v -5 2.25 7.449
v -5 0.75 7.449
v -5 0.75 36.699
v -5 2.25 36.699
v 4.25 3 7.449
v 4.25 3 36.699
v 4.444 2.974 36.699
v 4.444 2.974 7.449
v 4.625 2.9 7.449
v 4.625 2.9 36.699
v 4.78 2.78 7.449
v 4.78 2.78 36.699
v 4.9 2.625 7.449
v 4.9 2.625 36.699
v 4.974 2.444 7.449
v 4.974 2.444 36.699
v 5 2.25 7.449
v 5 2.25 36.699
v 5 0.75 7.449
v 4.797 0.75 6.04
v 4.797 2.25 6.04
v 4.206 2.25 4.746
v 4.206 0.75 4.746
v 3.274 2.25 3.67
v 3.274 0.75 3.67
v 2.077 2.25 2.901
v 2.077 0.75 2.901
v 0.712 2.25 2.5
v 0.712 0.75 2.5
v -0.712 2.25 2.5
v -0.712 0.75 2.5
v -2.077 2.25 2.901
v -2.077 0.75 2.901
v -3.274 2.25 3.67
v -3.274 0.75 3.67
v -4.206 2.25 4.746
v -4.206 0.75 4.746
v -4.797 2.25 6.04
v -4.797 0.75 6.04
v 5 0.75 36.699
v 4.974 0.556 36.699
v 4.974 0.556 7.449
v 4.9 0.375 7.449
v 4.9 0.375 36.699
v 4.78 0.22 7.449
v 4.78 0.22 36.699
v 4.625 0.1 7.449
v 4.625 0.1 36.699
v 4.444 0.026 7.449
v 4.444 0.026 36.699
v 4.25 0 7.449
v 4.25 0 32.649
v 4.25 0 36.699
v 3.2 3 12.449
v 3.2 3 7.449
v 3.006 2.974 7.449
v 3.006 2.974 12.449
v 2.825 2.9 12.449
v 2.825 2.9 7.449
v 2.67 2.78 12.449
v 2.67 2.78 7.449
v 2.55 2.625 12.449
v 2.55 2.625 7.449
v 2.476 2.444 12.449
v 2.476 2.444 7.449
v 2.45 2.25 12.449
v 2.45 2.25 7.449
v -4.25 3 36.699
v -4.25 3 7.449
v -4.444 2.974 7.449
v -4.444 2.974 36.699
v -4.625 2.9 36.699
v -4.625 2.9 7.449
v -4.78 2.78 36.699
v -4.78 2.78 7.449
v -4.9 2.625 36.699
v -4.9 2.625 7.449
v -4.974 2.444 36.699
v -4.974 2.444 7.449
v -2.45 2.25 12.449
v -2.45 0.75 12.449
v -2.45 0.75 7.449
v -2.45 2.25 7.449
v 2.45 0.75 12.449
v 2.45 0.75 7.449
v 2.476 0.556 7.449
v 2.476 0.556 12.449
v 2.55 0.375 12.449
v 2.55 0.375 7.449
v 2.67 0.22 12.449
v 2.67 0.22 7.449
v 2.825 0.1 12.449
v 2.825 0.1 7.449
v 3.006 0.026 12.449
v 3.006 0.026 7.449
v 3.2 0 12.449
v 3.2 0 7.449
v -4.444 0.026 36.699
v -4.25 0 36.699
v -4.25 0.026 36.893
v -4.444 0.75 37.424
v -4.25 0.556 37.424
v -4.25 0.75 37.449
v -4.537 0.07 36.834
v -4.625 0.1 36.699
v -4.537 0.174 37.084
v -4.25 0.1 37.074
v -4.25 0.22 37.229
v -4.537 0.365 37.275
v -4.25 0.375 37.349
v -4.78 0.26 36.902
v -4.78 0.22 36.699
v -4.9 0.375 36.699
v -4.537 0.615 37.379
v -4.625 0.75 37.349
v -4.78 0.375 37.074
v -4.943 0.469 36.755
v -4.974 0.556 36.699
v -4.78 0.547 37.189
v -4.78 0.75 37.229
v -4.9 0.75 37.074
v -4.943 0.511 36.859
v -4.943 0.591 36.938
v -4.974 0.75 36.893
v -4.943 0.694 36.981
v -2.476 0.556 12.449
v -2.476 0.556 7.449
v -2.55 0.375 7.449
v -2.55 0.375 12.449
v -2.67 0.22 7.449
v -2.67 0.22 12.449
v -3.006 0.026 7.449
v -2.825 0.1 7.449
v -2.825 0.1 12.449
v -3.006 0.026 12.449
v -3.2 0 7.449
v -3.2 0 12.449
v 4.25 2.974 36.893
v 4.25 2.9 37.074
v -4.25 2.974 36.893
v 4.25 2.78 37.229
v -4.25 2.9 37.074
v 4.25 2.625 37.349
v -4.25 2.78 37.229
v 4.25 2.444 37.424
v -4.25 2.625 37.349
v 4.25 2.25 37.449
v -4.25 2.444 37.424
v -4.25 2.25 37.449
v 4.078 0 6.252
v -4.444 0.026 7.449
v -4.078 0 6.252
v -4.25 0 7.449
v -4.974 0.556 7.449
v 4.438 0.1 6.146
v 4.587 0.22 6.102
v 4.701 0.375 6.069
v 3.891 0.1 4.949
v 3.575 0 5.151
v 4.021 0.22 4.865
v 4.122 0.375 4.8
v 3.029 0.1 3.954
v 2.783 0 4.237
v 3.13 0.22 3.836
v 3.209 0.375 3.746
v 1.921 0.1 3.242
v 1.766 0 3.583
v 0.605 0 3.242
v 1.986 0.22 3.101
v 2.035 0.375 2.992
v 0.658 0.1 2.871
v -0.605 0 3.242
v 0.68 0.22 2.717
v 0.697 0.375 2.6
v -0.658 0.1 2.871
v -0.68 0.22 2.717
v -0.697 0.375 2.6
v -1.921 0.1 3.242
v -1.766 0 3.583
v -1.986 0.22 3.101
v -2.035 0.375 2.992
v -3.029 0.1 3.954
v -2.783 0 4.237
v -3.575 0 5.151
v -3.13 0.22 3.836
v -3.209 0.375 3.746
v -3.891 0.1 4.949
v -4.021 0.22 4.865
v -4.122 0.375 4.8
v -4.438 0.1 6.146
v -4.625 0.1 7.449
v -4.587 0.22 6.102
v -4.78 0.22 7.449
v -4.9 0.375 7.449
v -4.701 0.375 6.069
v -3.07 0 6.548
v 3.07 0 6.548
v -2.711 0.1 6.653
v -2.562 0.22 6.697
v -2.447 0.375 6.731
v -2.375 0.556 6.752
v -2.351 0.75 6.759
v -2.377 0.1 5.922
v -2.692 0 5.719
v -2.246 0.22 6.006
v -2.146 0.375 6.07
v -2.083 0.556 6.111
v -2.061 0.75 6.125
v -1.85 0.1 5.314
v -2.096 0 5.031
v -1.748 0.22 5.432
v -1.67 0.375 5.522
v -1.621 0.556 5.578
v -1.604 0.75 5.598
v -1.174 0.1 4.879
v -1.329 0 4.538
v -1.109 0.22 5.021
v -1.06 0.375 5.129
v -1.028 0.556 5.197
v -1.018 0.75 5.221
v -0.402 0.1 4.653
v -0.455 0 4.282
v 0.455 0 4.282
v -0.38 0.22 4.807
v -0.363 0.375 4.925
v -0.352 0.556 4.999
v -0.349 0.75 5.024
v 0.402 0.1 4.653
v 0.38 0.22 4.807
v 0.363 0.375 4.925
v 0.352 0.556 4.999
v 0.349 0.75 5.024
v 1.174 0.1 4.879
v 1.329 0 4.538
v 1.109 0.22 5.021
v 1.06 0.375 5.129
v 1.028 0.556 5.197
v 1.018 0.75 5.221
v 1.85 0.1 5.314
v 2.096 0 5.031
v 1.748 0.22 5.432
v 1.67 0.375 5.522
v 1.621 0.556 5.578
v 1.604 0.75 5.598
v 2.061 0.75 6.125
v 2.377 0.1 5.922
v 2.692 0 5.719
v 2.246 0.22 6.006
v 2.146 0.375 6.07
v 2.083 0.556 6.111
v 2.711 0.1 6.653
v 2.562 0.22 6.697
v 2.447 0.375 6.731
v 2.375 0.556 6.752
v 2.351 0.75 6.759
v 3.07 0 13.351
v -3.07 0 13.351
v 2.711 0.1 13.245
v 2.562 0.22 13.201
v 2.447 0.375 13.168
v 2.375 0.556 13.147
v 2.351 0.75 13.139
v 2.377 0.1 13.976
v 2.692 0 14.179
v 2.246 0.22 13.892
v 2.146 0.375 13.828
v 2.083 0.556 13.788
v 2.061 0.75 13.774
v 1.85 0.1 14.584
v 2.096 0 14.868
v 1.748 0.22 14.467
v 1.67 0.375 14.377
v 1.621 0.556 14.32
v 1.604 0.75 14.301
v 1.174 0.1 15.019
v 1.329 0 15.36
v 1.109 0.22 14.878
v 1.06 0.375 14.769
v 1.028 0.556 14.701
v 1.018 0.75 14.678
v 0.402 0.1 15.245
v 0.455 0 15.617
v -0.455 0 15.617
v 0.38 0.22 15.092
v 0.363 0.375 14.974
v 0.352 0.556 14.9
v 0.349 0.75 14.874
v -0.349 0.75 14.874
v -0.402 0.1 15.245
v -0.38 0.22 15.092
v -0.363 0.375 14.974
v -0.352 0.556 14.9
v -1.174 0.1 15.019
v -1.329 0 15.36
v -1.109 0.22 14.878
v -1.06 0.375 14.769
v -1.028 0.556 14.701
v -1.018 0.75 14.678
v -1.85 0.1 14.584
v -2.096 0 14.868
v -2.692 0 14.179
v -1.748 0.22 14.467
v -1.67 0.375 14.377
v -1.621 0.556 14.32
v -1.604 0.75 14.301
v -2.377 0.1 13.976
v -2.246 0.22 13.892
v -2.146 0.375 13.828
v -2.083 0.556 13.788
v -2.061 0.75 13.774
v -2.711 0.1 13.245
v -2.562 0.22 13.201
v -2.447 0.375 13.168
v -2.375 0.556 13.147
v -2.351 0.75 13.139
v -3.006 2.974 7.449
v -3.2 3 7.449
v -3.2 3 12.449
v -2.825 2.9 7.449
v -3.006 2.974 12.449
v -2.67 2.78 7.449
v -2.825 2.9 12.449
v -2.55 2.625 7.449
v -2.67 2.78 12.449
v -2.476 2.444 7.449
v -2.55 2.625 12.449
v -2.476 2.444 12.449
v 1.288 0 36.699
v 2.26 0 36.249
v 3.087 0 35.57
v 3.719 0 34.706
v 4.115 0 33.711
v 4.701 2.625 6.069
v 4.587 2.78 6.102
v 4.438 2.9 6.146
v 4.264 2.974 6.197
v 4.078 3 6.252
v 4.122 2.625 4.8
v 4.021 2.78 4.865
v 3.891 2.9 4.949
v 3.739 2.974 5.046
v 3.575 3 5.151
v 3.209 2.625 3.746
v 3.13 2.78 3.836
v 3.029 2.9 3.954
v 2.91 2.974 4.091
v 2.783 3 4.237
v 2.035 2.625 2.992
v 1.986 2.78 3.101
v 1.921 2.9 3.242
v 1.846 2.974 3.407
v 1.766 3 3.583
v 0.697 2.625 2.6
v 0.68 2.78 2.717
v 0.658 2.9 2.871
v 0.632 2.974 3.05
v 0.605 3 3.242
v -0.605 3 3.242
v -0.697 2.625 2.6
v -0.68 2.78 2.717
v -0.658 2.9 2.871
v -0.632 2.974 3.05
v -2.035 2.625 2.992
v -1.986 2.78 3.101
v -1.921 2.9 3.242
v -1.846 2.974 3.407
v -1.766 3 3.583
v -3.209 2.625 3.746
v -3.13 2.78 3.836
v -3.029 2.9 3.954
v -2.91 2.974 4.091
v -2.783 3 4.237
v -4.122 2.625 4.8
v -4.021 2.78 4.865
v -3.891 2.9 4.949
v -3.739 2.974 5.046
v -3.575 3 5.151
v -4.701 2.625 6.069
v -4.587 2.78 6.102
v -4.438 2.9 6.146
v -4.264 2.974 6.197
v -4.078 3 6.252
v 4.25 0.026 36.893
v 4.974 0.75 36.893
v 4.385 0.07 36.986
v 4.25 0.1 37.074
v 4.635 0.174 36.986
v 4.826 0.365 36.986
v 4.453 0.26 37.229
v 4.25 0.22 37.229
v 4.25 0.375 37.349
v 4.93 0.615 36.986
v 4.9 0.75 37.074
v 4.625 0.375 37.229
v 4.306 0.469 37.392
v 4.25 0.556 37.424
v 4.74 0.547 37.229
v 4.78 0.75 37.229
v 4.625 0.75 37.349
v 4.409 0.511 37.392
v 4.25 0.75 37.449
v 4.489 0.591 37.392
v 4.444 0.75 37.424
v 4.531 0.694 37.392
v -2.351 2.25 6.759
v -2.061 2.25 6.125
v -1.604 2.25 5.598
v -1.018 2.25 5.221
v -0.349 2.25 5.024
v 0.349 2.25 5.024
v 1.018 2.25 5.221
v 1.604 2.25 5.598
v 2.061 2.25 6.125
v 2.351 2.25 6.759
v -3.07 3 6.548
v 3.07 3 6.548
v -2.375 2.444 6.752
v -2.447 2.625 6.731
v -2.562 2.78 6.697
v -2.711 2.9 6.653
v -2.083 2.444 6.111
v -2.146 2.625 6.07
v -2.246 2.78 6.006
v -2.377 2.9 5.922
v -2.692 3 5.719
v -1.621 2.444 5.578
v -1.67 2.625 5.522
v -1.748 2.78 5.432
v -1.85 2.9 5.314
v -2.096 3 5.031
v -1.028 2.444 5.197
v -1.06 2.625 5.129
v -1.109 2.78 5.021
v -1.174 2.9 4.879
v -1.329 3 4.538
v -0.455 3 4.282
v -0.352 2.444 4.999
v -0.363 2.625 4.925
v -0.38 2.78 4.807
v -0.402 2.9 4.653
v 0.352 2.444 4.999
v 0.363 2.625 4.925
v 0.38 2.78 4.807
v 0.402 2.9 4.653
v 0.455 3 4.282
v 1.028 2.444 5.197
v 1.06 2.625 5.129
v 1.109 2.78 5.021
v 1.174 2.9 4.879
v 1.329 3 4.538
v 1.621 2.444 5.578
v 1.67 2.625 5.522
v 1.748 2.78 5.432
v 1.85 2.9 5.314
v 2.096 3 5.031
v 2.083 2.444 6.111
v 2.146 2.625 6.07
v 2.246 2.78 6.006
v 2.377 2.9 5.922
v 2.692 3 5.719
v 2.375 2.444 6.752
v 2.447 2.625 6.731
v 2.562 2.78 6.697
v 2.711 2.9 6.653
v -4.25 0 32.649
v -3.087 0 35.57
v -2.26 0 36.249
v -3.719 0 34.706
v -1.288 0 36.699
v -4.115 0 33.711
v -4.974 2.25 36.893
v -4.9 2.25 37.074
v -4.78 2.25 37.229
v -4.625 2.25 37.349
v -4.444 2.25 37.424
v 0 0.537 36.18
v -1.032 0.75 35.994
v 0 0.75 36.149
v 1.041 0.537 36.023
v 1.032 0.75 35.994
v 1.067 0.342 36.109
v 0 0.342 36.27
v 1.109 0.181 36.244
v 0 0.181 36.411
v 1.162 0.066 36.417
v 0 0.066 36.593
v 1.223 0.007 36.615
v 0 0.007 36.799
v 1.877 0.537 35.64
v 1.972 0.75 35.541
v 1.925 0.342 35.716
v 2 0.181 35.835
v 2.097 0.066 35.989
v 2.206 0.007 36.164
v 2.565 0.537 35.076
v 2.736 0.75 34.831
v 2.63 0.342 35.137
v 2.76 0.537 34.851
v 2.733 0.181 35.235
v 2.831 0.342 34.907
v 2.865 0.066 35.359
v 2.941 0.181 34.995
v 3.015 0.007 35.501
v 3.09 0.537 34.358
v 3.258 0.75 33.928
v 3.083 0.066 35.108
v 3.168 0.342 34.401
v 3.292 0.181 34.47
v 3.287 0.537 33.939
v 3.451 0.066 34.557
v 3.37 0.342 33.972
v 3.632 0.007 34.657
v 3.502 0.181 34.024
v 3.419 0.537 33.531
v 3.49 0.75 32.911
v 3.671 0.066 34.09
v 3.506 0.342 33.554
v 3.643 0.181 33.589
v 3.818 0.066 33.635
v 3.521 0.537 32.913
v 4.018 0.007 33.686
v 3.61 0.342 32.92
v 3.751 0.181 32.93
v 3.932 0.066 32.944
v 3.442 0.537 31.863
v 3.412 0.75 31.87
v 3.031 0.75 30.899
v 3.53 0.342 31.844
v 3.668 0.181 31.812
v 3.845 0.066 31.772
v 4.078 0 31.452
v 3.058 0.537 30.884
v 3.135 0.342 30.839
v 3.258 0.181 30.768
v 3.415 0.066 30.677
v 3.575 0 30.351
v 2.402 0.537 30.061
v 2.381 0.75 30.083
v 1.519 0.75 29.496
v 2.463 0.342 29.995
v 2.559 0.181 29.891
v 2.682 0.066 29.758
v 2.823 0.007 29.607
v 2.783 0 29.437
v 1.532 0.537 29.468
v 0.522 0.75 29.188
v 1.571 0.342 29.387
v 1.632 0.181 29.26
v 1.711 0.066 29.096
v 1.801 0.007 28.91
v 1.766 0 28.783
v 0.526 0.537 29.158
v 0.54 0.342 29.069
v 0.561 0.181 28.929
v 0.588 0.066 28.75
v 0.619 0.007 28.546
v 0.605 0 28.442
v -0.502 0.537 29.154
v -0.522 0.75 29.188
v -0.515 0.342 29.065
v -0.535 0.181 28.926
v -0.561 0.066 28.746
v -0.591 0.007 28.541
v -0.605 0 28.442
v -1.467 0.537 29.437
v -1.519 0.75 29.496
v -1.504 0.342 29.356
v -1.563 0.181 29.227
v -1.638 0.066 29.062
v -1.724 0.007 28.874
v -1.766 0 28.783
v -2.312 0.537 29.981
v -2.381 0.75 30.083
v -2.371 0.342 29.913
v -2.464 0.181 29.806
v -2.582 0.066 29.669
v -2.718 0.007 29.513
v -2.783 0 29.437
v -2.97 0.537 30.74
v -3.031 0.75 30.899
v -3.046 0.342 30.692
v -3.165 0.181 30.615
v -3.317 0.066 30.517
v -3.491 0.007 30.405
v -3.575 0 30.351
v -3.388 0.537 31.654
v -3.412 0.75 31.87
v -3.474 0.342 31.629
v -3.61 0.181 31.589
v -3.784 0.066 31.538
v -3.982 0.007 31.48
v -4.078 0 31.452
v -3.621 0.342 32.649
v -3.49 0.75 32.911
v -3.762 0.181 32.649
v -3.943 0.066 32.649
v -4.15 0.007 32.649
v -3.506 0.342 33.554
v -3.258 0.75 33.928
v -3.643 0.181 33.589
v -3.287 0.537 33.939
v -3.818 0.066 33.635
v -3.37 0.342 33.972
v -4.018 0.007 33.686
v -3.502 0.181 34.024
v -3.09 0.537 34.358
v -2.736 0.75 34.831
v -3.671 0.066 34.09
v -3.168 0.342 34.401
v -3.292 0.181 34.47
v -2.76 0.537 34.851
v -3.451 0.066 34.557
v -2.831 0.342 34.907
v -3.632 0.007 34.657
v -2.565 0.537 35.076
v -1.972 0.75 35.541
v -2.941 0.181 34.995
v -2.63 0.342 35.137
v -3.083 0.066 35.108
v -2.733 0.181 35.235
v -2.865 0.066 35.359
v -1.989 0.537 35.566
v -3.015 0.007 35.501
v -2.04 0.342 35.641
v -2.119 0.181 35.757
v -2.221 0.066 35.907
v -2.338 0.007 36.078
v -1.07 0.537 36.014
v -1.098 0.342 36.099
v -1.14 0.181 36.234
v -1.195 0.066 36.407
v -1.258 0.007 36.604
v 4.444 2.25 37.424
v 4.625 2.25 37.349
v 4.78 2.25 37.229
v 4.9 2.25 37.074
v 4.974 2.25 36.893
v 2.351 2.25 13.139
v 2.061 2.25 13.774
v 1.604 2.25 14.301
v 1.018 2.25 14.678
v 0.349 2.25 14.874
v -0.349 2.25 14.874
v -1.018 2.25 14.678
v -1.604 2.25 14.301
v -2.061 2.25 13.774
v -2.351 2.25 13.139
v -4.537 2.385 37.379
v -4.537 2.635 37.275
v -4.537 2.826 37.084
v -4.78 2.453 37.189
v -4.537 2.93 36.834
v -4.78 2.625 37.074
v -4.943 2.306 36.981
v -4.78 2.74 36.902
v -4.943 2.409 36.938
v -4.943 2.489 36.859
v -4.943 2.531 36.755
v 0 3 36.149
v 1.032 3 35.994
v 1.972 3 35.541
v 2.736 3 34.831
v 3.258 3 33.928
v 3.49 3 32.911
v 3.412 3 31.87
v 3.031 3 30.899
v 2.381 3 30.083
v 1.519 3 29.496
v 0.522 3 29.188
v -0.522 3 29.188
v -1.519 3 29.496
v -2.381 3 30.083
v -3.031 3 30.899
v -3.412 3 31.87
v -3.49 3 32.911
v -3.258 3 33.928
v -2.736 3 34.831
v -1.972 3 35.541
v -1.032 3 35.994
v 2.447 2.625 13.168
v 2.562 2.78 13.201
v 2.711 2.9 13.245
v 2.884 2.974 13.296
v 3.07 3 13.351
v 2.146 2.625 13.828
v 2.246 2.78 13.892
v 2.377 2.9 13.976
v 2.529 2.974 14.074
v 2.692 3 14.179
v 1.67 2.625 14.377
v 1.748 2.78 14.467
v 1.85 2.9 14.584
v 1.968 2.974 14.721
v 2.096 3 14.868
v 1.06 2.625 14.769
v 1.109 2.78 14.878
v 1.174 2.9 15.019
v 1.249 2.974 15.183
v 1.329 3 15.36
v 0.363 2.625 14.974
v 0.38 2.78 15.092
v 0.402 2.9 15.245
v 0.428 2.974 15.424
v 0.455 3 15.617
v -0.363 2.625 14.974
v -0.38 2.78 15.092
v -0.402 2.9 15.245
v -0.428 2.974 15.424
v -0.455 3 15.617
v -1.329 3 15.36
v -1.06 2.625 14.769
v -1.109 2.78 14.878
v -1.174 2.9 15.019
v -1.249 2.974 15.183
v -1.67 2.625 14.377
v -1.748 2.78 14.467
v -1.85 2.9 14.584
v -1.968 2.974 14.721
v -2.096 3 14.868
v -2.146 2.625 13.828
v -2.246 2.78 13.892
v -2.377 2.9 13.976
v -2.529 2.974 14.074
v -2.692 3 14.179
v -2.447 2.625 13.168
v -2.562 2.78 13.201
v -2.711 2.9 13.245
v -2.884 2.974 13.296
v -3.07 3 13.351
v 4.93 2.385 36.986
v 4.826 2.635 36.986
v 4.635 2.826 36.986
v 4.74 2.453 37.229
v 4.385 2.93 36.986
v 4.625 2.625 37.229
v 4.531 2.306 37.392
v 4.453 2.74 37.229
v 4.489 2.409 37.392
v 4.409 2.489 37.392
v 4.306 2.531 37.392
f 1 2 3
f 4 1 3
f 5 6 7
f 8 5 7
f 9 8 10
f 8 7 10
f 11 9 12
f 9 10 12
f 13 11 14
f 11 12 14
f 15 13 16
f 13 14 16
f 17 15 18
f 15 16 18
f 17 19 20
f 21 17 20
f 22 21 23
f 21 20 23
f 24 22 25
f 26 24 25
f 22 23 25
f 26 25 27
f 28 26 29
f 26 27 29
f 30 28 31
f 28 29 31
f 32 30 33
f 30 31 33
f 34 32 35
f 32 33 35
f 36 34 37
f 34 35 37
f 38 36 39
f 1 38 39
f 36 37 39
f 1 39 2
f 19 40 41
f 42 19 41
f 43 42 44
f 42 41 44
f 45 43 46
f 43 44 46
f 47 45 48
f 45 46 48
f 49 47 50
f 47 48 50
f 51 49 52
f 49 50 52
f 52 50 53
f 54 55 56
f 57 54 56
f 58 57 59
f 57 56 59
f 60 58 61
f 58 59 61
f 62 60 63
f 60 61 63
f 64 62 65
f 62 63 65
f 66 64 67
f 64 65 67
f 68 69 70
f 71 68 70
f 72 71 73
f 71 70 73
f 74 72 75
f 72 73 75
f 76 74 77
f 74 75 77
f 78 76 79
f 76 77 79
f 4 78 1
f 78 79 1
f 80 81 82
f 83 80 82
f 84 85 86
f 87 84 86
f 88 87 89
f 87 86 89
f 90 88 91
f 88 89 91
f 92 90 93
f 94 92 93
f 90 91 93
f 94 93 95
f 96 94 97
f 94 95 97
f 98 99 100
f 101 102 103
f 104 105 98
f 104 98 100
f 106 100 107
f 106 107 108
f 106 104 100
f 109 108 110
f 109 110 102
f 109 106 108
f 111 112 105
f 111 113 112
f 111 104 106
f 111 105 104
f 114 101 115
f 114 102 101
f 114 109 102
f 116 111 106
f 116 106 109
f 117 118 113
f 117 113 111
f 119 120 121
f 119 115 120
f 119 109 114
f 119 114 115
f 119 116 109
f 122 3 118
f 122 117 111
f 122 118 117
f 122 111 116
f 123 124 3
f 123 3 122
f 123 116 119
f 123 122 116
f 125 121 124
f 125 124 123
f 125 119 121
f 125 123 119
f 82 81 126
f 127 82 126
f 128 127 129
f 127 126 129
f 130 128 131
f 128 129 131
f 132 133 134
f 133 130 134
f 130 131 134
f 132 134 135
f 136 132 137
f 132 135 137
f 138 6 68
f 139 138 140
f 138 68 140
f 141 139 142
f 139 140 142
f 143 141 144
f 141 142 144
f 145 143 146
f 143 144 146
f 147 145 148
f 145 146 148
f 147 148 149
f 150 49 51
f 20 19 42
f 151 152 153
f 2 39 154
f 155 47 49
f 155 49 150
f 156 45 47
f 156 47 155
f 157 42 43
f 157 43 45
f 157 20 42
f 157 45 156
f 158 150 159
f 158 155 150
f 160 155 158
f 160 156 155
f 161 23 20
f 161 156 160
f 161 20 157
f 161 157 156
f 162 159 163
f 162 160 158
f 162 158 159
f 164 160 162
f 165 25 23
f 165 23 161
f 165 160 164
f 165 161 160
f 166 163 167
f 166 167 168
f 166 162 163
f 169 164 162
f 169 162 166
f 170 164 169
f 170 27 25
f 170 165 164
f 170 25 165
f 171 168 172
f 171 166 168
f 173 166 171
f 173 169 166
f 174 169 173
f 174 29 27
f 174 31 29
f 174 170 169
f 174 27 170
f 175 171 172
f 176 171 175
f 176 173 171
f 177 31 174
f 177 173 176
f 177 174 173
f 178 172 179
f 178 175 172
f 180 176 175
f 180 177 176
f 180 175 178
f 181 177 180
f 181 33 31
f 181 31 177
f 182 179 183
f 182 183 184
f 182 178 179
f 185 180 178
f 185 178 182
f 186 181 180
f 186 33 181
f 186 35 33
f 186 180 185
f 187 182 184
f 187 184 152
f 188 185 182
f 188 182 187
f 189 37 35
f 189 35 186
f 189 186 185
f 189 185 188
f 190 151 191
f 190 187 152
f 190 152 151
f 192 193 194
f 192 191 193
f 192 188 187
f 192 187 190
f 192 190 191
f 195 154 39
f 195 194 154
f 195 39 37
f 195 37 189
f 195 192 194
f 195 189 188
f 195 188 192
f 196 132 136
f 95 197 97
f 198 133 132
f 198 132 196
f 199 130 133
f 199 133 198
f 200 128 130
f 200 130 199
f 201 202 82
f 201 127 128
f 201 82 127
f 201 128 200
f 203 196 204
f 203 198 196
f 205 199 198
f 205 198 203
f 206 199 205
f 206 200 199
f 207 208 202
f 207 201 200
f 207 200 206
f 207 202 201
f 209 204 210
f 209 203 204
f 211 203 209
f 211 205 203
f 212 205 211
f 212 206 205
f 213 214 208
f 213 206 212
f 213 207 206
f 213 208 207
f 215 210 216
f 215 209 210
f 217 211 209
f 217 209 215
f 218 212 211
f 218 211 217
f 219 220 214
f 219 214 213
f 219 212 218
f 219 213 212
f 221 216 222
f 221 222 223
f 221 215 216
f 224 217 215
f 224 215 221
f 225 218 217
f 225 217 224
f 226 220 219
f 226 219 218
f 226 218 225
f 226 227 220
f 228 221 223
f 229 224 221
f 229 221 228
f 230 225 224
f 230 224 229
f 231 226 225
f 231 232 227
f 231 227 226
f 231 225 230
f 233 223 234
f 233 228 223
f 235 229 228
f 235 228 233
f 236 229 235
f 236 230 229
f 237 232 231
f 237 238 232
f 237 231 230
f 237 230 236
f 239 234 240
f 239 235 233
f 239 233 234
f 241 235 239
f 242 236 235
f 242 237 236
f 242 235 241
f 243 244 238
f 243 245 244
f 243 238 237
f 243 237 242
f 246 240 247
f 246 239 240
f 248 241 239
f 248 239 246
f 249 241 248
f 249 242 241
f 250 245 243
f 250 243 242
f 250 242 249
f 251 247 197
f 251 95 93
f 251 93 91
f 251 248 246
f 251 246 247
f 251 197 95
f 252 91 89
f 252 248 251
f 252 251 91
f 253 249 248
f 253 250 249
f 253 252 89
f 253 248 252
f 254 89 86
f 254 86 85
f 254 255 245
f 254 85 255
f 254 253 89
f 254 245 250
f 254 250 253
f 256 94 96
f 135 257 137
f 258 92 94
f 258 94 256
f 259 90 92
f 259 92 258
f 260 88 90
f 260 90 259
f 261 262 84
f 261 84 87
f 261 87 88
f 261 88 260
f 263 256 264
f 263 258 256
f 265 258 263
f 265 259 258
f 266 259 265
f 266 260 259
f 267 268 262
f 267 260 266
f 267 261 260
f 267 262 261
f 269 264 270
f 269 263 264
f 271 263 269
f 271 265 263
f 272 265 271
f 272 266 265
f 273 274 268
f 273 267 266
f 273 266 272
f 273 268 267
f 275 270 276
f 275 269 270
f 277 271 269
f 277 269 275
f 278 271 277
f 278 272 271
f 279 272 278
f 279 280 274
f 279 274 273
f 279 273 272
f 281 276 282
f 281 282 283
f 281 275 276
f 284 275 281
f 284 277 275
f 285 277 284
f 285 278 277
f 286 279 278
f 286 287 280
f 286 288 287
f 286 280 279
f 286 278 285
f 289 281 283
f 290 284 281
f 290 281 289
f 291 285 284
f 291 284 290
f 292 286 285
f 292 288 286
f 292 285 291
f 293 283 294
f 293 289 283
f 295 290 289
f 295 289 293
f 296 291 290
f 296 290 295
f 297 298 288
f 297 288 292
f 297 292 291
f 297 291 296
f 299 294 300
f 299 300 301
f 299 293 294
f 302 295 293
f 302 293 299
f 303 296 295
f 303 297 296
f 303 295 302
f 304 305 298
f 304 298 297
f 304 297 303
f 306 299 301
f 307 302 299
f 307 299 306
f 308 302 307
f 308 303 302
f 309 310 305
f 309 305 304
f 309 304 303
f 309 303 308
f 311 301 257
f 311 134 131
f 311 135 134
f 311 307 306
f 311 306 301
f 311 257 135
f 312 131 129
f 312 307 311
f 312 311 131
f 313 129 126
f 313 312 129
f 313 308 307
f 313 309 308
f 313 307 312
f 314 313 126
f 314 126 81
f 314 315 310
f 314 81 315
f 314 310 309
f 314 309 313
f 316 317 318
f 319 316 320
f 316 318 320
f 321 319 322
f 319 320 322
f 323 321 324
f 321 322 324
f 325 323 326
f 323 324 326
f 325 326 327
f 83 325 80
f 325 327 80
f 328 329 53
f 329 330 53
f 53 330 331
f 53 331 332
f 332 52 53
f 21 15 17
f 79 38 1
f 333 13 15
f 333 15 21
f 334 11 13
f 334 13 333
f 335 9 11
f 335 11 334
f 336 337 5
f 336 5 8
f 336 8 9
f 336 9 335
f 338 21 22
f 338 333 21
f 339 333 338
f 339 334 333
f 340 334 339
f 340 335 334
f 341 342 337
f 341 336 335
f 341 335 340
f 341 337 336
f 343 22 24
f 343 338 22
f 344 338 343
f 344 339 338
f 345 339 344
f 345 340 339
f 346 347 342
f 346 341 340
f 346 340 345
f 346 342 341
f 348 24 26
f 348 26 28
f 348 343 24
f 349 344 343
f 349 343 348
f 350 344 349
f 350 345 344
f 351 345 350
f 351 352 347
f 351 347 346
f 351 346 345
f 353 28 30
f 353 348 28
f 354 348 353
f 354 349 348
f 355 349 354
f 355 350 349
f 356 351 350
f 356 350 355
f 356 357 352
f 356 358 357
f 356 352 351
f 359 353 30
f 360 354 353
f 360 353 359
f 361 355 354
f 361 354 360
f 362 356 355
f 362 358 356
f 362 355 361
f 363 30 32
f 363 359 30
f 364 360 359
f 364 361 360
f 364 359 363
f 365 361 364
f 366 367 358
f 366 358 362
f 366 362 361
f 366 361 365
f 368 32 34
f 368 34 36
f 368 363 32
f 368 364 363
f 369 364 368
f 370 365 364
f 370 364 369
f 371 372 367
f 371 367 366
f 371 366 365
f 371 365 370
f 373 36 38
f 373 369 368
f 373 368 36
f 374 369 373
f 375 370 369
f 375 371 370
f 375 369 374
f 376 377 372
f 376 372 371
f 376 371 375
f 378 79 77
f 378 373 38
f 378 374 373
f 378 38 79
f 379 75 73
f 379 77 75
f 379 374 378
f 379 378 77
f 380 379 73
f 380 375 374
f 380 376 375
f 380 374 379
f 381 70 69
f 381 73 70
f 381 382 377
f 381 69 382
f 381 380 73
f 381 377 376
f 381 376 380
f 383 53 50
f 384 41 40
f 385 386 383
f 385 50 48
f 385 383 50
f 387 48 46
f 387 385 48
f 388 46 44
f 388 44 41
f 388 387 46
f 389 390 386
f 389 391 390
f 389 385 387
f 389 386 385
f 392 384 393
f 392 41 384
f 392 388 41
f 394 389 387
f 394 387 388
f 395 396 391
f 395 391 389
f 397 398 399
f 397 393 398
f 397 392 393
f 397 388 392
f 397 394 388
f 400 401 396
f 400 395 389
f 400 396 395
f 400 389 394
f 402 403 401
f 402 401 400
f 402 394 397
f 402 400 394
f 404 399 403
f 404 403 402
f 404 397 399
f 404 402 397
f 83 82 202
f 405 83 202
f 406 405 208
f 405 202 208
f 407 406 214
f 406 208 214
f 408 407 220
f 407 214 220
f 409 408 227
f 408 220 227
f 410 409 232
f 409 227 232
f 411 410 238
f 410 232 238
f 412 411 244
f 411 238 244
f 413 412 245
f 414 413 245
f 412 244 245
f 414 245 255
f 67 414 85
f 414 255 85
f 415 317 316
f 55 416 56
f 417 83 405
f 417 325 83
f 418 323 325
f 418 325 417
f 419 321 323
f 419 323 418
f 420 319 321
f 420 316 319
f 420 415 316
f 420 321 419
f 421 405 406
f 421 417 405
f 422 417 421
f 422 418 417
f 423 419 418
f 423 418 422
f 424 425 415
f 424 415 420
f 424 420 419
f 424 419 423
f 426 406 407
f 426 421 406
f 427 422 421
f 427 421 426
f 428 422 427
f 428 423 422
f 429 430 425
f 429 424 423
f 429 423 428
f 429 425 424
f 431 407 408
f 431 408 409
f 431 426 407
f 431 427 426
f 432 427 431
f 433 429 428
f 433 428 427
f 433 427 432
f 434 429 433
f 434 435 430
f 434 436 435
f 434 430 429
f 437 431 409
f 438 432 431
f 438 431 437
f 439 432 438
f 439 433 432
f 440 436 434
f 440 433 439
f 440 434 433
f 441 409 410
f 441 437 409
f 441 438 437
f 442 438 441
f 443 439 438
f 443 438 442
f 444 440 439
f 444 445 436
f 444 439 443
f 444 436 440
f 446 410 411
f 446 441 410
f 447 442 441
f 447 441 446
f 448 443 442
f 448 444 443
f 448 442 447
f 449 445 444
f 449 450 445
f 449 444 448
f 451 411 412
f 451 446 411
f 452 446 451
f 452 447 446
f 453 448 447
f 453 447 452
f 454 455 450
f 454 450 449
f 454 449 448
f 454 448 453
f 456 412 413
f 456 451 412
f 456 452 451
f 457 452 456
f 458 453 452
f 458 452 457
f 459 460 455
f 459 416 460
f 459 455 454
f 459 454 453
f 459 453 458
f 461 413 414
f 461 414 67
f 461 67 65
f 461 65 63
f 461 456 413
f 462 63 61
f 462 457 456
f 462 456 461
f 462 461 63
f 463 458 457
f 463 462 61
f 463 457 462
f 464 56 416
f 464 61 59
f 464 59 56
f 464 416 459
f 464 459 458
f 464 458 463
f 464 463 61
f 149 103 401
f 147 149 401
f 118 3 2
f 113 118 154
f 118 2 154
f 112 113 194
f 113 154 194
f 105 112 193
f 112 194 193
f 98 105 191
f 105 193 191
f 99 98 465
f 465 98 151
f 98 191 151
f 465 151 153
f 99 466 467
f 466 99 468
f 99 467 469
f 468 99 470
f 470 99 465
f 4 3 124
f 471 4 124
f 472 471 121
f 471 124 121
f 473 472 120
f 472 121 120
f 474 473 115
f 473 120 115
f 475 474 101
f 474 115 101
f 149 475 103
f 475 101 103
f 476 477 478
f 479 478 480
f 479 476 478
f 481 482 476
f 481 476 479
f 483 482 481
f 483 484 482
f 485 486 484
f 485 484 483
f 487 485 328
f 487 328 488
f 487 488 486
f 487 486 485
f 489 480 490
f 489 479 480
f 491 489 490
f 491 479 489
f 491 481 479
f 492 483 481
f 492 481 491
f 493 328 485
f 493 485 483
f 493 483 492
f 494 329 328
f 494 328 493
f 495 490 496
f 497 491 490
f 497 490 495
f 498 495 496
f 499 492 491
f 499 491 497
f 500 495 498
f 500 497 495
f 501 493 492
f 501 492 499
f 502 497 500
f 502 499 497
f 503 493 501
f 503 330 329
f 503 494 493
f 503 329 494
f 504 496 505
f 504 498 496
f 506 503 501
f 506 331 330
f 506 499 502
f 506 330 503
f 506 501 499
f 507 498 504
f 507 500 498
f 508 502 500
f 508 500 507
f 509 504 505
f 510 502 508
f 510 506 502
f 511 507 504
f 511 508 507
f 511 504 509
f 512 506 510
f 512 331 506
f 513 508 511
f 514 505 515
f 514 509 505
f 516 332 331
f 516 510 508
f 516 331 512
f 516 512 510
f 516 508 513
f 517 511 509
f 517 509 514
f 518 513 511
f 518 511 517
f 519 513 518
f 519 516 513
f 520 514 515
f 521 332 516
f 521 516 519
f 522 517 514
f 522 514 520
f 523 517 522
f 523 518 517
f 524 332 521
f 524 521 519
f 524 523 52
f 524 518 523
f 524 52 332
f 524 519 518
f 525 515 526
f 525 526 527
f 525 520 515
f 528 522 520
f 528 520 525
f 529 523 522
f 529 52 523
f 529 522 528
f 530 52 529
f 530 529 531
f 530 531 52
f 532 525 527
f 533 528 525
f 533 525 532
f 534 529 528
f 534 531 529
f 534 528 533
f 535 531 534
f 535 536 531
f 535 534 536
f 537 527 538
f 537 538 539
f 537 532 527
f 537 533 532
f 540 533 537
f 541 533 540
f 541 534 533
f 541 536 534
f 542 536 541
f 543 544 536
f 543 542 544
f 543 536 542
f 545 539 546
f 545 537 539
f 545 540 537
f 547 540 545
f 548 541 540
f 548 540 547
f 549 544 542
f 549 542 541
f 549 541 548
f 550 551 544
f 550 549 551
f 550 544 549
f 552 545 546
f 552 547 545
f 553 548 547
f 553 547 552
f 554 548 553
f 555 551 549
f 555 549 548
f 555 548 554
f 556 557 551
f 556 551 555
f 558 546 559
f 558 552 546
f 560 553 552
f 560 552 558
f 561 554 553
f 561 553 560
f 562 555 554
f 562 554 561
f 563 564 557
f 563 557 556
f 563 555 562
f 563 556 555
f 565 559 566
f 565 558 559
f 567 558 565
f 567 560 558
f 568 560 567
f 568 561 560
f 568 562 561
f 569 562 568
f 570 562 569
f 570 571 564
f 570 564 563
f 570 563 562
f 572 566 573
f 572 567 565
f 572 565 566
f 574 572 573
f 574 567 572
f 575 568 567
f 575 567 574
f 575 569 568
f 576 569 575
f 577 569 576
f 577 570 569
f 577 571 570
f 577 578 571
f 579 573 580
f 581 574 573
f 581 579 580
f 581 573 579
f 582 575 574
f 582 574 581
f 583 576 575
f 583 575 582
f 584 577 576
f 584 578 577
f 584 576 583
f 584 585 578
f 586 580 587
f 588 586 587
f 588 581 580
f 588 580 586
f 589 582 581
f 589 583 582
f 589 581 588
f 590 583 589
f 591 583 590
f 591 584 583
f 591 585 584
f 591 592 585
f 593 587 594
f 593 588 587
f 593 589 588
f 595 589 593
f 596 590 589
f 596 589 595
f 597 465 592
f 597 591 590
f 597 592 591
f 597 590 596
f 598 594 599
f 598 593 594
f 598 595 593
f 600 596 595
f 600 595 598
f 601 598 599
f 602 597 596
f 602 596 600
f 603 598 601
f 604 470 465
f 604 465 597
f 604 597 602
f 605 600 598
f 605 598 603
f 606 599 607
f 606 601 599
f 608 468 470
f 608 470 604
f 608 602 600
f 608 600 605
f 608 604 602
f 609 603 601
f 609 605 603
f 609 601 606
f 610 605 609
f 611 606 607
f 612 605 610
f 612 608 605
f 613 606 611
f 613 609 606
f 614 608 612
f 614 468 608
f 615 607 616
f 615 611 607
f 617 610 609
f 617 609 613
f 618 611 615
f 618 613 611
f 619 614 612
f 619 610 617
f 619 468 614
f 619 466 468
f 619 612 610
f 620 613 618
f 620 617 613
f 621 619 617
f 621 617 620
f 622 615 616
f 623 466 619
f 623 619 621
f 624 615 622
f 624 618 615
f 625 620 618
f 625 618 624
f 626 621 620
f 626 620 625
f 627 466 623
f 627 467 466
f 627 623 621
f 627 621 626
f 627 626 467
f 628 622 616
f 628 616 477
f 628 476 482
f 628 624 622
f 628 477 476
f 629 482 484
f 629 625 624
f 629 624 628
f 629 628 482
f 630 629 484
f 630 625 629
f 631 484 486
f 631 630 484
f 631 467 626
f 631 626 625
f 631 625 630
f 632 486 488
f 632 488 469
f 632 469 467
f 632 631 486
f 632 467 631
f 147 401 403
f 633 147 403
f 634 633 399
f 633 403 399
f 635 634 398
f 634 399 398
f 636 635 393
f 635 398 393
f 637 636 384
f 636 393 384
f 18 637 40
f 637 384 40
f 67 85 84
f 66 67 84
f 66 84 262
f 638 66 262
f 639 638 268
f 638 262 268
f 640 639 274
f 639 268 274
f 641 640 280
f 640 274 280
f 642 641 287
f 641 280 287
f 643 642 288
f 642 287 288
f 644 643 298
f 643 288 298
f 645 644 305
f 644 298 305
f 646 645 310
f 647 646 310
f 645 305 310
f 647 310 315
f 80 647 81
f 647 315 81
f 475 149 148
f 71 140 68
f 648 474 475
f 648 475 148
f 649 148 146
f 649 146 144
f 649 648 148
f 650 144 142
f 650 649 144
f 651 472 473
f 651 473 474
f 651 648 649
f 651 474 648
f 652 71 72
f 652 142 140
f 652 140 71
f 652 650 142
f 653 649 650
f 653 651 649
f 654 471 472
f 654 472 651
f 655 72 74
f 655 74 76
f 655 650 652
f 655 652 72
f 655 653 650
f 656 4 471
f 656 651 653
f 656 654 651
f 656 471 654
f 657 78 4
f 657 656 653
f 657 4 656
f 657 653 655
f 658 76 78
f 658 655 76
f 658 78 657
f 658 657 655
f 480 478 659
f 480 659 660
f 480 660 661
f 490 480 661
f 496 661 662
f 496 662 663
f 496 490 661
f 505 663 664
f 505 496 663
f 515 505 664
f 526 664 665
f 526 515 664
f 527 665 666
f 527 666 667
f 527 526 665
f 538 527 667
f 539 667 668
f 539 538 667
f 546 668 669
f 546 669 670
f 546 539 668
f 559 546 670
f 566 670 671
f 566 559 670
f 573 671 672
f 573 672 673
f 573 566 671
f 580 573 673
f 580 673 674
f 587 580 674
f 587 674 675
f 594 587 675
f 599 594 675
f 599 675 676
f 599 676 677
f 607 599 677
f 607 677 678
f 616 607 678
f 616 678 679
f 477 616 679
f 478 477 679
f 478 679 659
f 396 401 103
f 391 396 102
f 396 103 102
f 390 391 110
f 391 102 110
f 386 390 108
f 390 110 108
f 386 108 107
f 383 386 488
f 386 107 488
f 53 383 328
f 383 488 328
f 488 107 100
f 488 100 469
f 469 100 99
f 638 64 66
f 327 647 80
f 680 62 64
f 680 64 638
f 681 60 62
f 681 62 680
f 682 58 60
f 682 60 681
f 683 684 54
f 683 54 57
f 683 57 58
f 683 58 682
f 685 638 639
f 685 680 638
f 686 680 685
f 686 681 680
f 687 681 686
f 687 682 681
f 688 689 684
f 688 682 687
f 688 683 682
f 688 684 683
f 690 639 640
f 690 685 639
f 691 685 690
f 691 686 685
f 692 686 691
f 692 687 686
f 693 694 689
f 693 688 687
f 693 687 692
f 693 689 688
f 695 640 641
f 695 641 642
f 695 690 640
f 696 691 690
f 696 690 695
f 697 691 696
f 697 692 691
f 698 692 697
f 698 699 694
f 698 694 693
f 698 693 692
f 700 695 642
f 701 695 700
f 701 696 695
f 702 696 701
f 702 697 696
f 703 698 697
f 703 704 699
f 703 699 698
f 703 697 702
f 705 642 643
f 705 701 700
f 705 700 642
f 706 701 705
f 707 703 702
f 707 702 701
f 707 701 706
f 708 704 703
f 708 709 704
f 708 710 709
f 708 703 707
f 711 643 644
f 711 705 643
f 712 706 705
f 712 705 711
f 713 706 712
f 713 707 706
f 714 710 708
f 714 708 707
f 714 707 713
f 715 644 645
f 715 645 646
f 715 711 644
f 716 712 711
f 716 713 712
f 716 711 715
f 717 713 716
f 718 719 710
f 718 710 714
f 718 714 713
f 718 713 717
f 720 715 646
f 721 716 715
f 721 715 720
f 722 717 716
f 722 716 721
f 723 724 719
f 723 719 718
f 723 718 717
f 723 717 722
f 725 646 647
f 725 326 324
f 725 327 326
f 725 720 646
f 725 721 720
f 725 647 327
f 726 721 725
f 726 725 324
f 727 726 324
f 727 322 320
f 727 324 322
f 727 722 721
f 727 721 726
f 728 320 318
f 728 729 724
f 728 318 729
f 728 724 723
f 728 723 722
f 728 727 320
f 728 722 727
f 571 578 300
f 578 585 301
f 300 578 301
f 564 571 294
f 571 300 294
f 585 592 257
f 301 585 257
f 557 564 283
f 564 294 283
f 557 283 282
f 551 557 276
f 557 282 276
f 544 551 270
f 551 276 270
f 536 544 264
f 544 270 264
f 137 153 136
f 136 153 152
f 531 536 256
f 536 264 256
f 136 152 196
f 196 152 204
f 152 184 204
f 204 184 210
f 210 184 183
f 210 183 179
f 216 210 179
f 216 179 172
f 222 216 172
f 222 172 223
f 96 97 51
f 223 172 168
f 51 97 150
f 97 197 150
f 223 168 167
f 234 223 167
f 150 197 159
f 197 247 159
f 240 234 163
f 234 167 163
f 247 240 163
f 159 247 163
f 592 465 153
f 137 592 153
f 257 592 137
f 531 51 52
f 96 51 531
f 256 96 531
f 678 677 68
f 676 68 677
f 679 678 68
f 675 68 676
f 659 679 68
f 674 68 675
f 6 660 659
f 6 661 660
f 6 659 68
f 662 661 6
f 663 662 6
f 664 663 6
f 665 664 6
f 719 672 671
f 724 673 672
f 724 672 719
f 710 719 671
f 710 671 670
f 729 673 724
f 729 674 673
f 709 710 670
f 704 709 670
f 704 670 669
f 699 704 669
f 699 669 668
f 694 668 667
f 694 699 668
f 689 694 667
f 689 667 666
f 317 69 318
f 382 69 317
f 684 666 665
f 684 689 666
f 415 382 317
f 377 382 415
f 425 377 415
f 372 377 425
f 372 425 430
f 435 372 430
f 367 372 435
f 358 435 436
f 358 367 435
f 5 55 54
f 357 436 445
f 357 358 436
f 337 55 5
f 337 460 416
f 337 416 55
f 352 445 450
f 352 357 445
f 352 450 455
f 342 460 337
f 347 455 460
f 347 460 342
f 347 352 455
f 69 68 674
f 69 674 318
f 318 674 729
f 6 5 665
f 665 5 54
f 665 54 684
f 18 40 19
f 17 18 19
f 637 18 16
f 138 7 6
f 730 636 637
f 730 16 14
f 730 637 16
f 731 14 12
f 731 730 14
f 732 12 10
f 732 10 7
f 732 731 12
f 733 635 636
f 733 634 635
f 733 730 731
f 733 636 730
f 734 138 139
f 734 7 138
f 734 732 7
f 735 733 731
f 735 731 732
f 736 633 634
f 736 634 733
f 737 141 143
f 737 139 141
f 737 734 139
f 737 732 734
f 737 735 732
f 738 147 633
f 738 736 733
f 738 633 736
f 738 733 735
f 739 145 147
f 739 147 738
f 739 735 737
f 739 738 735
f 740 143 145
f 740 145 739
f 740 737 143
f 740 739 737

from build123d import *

# Parameters (mm, degrees)
SKETCH1_R           = 3.5
BOSS_EXTRUDE1_DEPTH = 3
FILLET1_R           = 0.75


with BuildPart() as part:
    # Sketch1 → Boss-Extrude1 (new body)
    with BuildSketch(Plane(origin=(0, 0, 0), x_dir=(1, 0, 0), z_dir=(0, 1, 0))):
        with BuildLine():
            Line((-5, -37.44915748), (5, -37.44915748))
            Line((5, -37.44915748), (5, -7.44915748))
            ThreePointArc((5, -7.44915748), (0, -2.44915748), (-5, -7.44915748))
            Line((-5, -7.44915748), (-5, -37.44915748))
        make_face()
        with Locations(Location((0, -32.64915748, 0), (0, 0, 270))):
            Circle(SKETCH1_R, mode=Mode.SUBTRACT)
        with BuildLine():
            Line((2.45, -7.44915748), (2.45, -12.44915748))
            ThreePointArc((2.45, -12.44915748), (0, -14.89915748), (-2.45, -12.44915748))
            Line((-2.45, -12.44915748), (-2.45, -7.44915748))
            ThreePointArc((-2.45, -7.44915748), (0, -4.99915748), (2.45, -7.44915748))
        make_face(mode=Mode.SUBTRACT)
    extrude(amount=BOSS_EXTRUDE1_DEPTH)

    # Fillet1
    # the kernel refuses this fillet: 0.75 mm, written as the material it takes off along each edge
    with BuildSketch(Plane(origin=(-4.25, 2.25, 36.69915748), x_dir=(0, 0, 1), z_dir=(-1, 0, 0))) as fillet1_piece_1_section:
        Polygon((0, 0), (FILLET1_R, 0), (FILLET1_R, FILLET1_R), (0, FILLET1_R), align=None)
    fillet1_piece_1 = extrude(amount=FILLET1_R, mode=Mode.PRIVATE)
    fillet1_piece_1 = fillet1_piece_1 - Plane(origin=(-4.25, 2.25, 36.69915748), x_dir=(0, -0.7071067811865475, -0.7071067811865475), z_dir=(-1, 0, 0)) * Sphere(FILLET1_R, mode=Mode.PRIVATE)
    add(fillet1_piece_1, mode=Mode.SUBTRACT)
    with BuildSketch(Plane(origin=(4.25, 2.25, 36.69915748), x_dir=(0, 1, 0), z_dir=(0, 0, 1))) as fillet1_piece_2_section:
        Polygon((0, 0), (FILLET1_R, 0), (FILLET1_R, -FILLET1_R), (0, -FILLET1_R), align=None)
    fillet1_piece_2 = extrude(amount=FILLET1_R, mode=Mode.PRIVATE)
    fillet1_piece_2 = fillet1_piece_2 - Plane(origin=(4.25, 2.25, 36.69915748), x_dir=(-0.7071067811865475, -0.7071067811865475, 0), z_dir=(0, 0, 1)) * Sphere(FILLET1_R, mode=Mode.PRIVATE)
    add(fillet1_piece_2, mode=Mode.SUBTRACT)
    with BuildSketch(Plane(origin=(-4.25, 0.75, 36.69915748), x_dir=(0, 0, 1), z_dir=(-1, 0, 0))) as fillet1_piece_3_section:
        Polygon((0, 0), (FILLET1_R, 0), (FILLET1_R, -FILLET1_R), (0, -FILLET1_R), align=None)
    fillet1_piece_3 = extrude(amount=FILLET1_R, mode=Mode.PRIVATE)
    fillet1_piece_3 = fillet1_piece_3 - Plane(origin=(-4.25, 0.75, 36.69915748), x_dir=(0, 0.7071067811865475, -0.7071067811865475), z_dir=(-1, 0, 0)) * Sphere(FILLET1_R, mode=Mode.PRIVATE)
    add(fillet1_piece_3, mode=Mode.SUBTRACT)
    with BuildSketch(Plane(origin=(4.25, 0.75, 36.69915748), x_dir=(1, 0, 0), z_dir=(0, 0, 1))) as fillet1_piece_4_section:
        Polygon((0, 0), (FILLET1_R, 0), (FILLET1_R, -FILLET1_R), (0, -FILLET1_R), align=None)
    fillet1_piece_4 = extrude(amount=FILLET1_R, mode=Mode.PRIVATE)
    fillet1_piece_4 = fillet1_piece_4 - Plane(origin=(4.25, 0.75, 36.69915748), x_dir=(-0.7071067811865475, 0.7071067811865475, 0), z_dir=(0, 0, 1)) * Sphere(FILLET1_R, mode=Mode.PRIVATE)
    add(fillet1_piece_4, mode=Mode.SUBTRACT)
    with BuildSketch(Plane(origin=(-5, 3, 7.44915748), x_dir=(0, -1, 0), z_dir=(0, 0, 1)), Plane(origin=(5, 3, 36.69915748), x_dir=(0, -1, 0), z_dir=(0, 0, -1))) as fillet1_piece_5:
        with BuildLine():
            CenterArc((FILLET1_R, FILLET1_R), FILLET1_R, 180, 90)
            Line((0, FILLET1_R), (0, 0))
            Line((0, 0), (FILLET1_R, 0))
        make_face()
    extrude(amount=29.25, mode=Mode.SUBTRACT)
    with BuildSketch(Plane(origin=(0, 0, 7.44915748), x_dir=(-1, 0, 0), z_dir=(0, 0, 1))) as fillet1_piece_6:
        with BuildLine():
            CenterArc((2.45 + FILLET1_R, -FILLET1_R), FILLET1_R, 90, 90)
            Line((2.45 + FILLET1_R, 0), (2.45, 0))
            Line((2.45, 0), (2.45, -FILLET1_R))
        make_face()
    revolve(axis=Axis((0, 0, 7.44915748), (0, -1, 0)), revolution_arc=180, mode=Mode.SUBTRACT)
    with BuildSketch(Plane(origin=(-2.45, 0, 12.44915748), x_dir=(0, 1, 0), z_dir=(0, 0, -1)), Plane(origin=(2.45, 0, 7.44915748), x_dir=(0, 1, 0), z_dir=(0, 0, 1))) as fillet1_piece_7:
        with BuildLine():
            CenterArc((FILLET1_R, -FILLET1_R), FILLET1_R, 90, 90)
            Line((0, -FILLET1_R), (0, 0))
            Line((0, 0), (FILLET1_R, 0))
        make_face()
    extrude(amount=5, mode=Mode.SUBTRACT)
    with BuildSketch(Plane(origin=(0, 0, 12.44915748), x_dir=(1, 0, 0), z_dir=(0, 0, -1))) as fillet1_piece_8:
        with BuildLine():
            CenterArc((2.45 + FILLET1_R, -FILLET1_R), FILLET1_R, 90, 90)
            Line((2.45 + FILLET1_R, 0), (2.45, 0))
            Line((2.45, 0), (2.45, -FILLET1_R))
        make_face()
    revolve(axis=Axis((0, 0, 12.44915748), (0, -1, 0)), revolution_arc=180, mode=Mode.SUBTRACT)
    with BuildSketch(Plane(origin=(0, 3, 7.44915748), x_dir=(-1, 0, 0), z_dir=(0, 0, 1))) as fillet1_piece_9:
        with BuildLine():
            CenterArc((2.45 + FILLET1_R, FILLET1_R), FILLET1_R, 180, 90)
            Line((2.45 + FILLET1_R, 0), (2.45, 0))
            Line((2.45, 0), (2.45, FILLET1_R))
        make_face()
    revolve(axis=Axis((0, 3, 7.44915748), (0, -1, 0)), revolution_arc=180, mode=Mode.SUBTRACT)
    with BuildSketch(Plane(origin=(-4.25, 3, 37.44915748), x_dir=(0, -1, 0), z_dir=(1, 0, 0))) as fillet1_piece_10:
        with BuildLine():
            CenterArc((FILLET1_R, FILLET1_R), FILLET1_R, 180, 90)
            Line((0, FILLET1_R), (0, 0))
            Line((0, 0), (FILLET1_R, 0))
        make_face()
    extrude(amount=8.5, mode=Mode.SUBTRACT)
    with BuildSketch(Plane(origin=(-2.45, 3, 12.44915748), x_dir=(0, -1, 0), z_dir=(0, 0, -1)), Plane(origin=(2.45, 3, 7.44915748), x_dir=(0, -1, 0), z_dir=(0, 0, 1))) as fillet1_piece_11:
        with BuildLine():
            CenterArc((FILLET1_R, FILLET1_R), FILLET1_R, 180, 90)
            Line((0, FILLET1_R), (0, 0))
            Line((0, 0), (FILLET1_R, 0))
        make_face()
    extrude(amount=5, mode=Mode.SUBTRACT)
    with BuildSketch(Plane(origin=(0, 3, 12.44915748), x_dir=(1, 0, 0), z_dir=(0, 0, -1))) as fillet1_piece_12:
        with BuildLine():
            CenterArc((2.45 + FILLET1_R, FILLET1_R), FILLET1_R, 180, 90)
            Line((2.45 + FILLET1_R, 0), (2.45, 0))
            Line((2.45, 0), (2.45, FILLET1_R))
        make_face()
    revolve(axis=Axis((0, 3, 12.44915748), (0, -1, 0)), revolution_arc=180, mode=Mode.SUBTRACT)
    with BuildSketch(Plane(origin=(0, 0, 32.64915748), x_dir=(0, 0, 1), z_dir=(-1, 0, 0))) as fillet1_piece_13:
        with BuildLine():
            CenterArc((3.5 + FILLET1_R, FILLET1_R), FILLET1_R, 180, 90)
            Line((3.5 + FILLET1_R, 0), (3.5, 0))
            Line((3.5, 0), (3.5, FILLET1_R))
        make_face()
    revolve(axis=Axis((0, 0, 32.64915748), (0, 1, 0)), mode=Mode.SUBTRACT)
    with BuildSketch(Plane(origin=(-4.25, 0, 37.44915748), x_dir=(0, 1, 0), z_dir=(1, 0, 0))) as fillet1_piece_14:
        with BuildLine():
            CenterArc((FILLET1_R, -FILLET1_R), FILLET1_R, 90, 90)
            Line((0, -FILLET1_R), (0, 0))
            Line((0, 0), (FILLET1_R, 0))
        make_face()
    extrude(amount=8.5, mode=Mode.SUBTRACT)
    with BuildSketch(Plane(origin=(-5, 0, 7.44915748), x_dir=(0, 1, 0), z_dir=(0, 0, 1)), Plane(origin=(5, 0, 36.69915748), x_dir=(0, 1, 0), z_dir=(0, 0, -1))) as fillet1_piece_15:
        with BuildLine():
            CenterArc((FILLET1_R, -FILLET1_R), FILLET1_R, 90, 90)
            Line((0, -FILLET1_R), (0, 0))
            Line((0, 0), (FILLET1_R, 0))
        make_face()
    extrude(amount=29.25, mode=Mode.SUBTRACT)
    with BuildSketch(Plane(origin=(0, 0, 7.44915748), x_dir=(1, 0, 0), z_dir=(0, 0, 1))) as fillet1_piece_16:
        with BuildLine():
            CenterArc((5 - FILLET1_R, FILLET1_R), FILLET1_R, 270, 90)
            Line((5 - FILLET1_R, 0), (5, 0))
            Line((5, 0), (5, FILLET1_R))
        make_face()
    revolve(axis=Axis((0, 0, 7.44915748), (0, 1, 0)), revolution_arc=180, mode=Mode.SUBTRACT)
    with BuildSketch(Plane(origin=(5, 0.75, 37.44915748), x_dir=(-1, 0, 0), z_dir=(0, 1, 0)), Plane(origin=(-5, 0.75, 37.44915748), x_dir=(0, 0, -1), z_dir=(0, 1, 0))) as fillet1_piece_17:
        with BuildLine():
            CenterArc((FILLET1_R, -FILLET1_R), FILLET1_R, 90, 90)
            Line((0, -FILLET1_R), (0, 0))
            Line((0, 0), (FILLET1_R, 0))
        make_face()
    extrude(amount=1.5, mode=Mode.SUBTRACT)
    with BuildSketch(Plane(origin=(0, 3, 7.44915748), x_dir=(1, 0, 0), z_dir=(0, 0, 1))) as fillet1_piece_18:
        with BuildLine():
            CenterArc((5 - FILLET1_R, -FILLET1_R), FILLET1_R, 0, 90)
            Line((5 - FILLET1_R, 0), (5, 0))
            Line((5, 0), (5, -FILLET1_R))
        make_face()
    revolve(axis=Axis((0, 3, 7.44915748), (0, 1, 0)), revolution_arc=180, mode=Mode.SUBTRACT)


solid = part.part
